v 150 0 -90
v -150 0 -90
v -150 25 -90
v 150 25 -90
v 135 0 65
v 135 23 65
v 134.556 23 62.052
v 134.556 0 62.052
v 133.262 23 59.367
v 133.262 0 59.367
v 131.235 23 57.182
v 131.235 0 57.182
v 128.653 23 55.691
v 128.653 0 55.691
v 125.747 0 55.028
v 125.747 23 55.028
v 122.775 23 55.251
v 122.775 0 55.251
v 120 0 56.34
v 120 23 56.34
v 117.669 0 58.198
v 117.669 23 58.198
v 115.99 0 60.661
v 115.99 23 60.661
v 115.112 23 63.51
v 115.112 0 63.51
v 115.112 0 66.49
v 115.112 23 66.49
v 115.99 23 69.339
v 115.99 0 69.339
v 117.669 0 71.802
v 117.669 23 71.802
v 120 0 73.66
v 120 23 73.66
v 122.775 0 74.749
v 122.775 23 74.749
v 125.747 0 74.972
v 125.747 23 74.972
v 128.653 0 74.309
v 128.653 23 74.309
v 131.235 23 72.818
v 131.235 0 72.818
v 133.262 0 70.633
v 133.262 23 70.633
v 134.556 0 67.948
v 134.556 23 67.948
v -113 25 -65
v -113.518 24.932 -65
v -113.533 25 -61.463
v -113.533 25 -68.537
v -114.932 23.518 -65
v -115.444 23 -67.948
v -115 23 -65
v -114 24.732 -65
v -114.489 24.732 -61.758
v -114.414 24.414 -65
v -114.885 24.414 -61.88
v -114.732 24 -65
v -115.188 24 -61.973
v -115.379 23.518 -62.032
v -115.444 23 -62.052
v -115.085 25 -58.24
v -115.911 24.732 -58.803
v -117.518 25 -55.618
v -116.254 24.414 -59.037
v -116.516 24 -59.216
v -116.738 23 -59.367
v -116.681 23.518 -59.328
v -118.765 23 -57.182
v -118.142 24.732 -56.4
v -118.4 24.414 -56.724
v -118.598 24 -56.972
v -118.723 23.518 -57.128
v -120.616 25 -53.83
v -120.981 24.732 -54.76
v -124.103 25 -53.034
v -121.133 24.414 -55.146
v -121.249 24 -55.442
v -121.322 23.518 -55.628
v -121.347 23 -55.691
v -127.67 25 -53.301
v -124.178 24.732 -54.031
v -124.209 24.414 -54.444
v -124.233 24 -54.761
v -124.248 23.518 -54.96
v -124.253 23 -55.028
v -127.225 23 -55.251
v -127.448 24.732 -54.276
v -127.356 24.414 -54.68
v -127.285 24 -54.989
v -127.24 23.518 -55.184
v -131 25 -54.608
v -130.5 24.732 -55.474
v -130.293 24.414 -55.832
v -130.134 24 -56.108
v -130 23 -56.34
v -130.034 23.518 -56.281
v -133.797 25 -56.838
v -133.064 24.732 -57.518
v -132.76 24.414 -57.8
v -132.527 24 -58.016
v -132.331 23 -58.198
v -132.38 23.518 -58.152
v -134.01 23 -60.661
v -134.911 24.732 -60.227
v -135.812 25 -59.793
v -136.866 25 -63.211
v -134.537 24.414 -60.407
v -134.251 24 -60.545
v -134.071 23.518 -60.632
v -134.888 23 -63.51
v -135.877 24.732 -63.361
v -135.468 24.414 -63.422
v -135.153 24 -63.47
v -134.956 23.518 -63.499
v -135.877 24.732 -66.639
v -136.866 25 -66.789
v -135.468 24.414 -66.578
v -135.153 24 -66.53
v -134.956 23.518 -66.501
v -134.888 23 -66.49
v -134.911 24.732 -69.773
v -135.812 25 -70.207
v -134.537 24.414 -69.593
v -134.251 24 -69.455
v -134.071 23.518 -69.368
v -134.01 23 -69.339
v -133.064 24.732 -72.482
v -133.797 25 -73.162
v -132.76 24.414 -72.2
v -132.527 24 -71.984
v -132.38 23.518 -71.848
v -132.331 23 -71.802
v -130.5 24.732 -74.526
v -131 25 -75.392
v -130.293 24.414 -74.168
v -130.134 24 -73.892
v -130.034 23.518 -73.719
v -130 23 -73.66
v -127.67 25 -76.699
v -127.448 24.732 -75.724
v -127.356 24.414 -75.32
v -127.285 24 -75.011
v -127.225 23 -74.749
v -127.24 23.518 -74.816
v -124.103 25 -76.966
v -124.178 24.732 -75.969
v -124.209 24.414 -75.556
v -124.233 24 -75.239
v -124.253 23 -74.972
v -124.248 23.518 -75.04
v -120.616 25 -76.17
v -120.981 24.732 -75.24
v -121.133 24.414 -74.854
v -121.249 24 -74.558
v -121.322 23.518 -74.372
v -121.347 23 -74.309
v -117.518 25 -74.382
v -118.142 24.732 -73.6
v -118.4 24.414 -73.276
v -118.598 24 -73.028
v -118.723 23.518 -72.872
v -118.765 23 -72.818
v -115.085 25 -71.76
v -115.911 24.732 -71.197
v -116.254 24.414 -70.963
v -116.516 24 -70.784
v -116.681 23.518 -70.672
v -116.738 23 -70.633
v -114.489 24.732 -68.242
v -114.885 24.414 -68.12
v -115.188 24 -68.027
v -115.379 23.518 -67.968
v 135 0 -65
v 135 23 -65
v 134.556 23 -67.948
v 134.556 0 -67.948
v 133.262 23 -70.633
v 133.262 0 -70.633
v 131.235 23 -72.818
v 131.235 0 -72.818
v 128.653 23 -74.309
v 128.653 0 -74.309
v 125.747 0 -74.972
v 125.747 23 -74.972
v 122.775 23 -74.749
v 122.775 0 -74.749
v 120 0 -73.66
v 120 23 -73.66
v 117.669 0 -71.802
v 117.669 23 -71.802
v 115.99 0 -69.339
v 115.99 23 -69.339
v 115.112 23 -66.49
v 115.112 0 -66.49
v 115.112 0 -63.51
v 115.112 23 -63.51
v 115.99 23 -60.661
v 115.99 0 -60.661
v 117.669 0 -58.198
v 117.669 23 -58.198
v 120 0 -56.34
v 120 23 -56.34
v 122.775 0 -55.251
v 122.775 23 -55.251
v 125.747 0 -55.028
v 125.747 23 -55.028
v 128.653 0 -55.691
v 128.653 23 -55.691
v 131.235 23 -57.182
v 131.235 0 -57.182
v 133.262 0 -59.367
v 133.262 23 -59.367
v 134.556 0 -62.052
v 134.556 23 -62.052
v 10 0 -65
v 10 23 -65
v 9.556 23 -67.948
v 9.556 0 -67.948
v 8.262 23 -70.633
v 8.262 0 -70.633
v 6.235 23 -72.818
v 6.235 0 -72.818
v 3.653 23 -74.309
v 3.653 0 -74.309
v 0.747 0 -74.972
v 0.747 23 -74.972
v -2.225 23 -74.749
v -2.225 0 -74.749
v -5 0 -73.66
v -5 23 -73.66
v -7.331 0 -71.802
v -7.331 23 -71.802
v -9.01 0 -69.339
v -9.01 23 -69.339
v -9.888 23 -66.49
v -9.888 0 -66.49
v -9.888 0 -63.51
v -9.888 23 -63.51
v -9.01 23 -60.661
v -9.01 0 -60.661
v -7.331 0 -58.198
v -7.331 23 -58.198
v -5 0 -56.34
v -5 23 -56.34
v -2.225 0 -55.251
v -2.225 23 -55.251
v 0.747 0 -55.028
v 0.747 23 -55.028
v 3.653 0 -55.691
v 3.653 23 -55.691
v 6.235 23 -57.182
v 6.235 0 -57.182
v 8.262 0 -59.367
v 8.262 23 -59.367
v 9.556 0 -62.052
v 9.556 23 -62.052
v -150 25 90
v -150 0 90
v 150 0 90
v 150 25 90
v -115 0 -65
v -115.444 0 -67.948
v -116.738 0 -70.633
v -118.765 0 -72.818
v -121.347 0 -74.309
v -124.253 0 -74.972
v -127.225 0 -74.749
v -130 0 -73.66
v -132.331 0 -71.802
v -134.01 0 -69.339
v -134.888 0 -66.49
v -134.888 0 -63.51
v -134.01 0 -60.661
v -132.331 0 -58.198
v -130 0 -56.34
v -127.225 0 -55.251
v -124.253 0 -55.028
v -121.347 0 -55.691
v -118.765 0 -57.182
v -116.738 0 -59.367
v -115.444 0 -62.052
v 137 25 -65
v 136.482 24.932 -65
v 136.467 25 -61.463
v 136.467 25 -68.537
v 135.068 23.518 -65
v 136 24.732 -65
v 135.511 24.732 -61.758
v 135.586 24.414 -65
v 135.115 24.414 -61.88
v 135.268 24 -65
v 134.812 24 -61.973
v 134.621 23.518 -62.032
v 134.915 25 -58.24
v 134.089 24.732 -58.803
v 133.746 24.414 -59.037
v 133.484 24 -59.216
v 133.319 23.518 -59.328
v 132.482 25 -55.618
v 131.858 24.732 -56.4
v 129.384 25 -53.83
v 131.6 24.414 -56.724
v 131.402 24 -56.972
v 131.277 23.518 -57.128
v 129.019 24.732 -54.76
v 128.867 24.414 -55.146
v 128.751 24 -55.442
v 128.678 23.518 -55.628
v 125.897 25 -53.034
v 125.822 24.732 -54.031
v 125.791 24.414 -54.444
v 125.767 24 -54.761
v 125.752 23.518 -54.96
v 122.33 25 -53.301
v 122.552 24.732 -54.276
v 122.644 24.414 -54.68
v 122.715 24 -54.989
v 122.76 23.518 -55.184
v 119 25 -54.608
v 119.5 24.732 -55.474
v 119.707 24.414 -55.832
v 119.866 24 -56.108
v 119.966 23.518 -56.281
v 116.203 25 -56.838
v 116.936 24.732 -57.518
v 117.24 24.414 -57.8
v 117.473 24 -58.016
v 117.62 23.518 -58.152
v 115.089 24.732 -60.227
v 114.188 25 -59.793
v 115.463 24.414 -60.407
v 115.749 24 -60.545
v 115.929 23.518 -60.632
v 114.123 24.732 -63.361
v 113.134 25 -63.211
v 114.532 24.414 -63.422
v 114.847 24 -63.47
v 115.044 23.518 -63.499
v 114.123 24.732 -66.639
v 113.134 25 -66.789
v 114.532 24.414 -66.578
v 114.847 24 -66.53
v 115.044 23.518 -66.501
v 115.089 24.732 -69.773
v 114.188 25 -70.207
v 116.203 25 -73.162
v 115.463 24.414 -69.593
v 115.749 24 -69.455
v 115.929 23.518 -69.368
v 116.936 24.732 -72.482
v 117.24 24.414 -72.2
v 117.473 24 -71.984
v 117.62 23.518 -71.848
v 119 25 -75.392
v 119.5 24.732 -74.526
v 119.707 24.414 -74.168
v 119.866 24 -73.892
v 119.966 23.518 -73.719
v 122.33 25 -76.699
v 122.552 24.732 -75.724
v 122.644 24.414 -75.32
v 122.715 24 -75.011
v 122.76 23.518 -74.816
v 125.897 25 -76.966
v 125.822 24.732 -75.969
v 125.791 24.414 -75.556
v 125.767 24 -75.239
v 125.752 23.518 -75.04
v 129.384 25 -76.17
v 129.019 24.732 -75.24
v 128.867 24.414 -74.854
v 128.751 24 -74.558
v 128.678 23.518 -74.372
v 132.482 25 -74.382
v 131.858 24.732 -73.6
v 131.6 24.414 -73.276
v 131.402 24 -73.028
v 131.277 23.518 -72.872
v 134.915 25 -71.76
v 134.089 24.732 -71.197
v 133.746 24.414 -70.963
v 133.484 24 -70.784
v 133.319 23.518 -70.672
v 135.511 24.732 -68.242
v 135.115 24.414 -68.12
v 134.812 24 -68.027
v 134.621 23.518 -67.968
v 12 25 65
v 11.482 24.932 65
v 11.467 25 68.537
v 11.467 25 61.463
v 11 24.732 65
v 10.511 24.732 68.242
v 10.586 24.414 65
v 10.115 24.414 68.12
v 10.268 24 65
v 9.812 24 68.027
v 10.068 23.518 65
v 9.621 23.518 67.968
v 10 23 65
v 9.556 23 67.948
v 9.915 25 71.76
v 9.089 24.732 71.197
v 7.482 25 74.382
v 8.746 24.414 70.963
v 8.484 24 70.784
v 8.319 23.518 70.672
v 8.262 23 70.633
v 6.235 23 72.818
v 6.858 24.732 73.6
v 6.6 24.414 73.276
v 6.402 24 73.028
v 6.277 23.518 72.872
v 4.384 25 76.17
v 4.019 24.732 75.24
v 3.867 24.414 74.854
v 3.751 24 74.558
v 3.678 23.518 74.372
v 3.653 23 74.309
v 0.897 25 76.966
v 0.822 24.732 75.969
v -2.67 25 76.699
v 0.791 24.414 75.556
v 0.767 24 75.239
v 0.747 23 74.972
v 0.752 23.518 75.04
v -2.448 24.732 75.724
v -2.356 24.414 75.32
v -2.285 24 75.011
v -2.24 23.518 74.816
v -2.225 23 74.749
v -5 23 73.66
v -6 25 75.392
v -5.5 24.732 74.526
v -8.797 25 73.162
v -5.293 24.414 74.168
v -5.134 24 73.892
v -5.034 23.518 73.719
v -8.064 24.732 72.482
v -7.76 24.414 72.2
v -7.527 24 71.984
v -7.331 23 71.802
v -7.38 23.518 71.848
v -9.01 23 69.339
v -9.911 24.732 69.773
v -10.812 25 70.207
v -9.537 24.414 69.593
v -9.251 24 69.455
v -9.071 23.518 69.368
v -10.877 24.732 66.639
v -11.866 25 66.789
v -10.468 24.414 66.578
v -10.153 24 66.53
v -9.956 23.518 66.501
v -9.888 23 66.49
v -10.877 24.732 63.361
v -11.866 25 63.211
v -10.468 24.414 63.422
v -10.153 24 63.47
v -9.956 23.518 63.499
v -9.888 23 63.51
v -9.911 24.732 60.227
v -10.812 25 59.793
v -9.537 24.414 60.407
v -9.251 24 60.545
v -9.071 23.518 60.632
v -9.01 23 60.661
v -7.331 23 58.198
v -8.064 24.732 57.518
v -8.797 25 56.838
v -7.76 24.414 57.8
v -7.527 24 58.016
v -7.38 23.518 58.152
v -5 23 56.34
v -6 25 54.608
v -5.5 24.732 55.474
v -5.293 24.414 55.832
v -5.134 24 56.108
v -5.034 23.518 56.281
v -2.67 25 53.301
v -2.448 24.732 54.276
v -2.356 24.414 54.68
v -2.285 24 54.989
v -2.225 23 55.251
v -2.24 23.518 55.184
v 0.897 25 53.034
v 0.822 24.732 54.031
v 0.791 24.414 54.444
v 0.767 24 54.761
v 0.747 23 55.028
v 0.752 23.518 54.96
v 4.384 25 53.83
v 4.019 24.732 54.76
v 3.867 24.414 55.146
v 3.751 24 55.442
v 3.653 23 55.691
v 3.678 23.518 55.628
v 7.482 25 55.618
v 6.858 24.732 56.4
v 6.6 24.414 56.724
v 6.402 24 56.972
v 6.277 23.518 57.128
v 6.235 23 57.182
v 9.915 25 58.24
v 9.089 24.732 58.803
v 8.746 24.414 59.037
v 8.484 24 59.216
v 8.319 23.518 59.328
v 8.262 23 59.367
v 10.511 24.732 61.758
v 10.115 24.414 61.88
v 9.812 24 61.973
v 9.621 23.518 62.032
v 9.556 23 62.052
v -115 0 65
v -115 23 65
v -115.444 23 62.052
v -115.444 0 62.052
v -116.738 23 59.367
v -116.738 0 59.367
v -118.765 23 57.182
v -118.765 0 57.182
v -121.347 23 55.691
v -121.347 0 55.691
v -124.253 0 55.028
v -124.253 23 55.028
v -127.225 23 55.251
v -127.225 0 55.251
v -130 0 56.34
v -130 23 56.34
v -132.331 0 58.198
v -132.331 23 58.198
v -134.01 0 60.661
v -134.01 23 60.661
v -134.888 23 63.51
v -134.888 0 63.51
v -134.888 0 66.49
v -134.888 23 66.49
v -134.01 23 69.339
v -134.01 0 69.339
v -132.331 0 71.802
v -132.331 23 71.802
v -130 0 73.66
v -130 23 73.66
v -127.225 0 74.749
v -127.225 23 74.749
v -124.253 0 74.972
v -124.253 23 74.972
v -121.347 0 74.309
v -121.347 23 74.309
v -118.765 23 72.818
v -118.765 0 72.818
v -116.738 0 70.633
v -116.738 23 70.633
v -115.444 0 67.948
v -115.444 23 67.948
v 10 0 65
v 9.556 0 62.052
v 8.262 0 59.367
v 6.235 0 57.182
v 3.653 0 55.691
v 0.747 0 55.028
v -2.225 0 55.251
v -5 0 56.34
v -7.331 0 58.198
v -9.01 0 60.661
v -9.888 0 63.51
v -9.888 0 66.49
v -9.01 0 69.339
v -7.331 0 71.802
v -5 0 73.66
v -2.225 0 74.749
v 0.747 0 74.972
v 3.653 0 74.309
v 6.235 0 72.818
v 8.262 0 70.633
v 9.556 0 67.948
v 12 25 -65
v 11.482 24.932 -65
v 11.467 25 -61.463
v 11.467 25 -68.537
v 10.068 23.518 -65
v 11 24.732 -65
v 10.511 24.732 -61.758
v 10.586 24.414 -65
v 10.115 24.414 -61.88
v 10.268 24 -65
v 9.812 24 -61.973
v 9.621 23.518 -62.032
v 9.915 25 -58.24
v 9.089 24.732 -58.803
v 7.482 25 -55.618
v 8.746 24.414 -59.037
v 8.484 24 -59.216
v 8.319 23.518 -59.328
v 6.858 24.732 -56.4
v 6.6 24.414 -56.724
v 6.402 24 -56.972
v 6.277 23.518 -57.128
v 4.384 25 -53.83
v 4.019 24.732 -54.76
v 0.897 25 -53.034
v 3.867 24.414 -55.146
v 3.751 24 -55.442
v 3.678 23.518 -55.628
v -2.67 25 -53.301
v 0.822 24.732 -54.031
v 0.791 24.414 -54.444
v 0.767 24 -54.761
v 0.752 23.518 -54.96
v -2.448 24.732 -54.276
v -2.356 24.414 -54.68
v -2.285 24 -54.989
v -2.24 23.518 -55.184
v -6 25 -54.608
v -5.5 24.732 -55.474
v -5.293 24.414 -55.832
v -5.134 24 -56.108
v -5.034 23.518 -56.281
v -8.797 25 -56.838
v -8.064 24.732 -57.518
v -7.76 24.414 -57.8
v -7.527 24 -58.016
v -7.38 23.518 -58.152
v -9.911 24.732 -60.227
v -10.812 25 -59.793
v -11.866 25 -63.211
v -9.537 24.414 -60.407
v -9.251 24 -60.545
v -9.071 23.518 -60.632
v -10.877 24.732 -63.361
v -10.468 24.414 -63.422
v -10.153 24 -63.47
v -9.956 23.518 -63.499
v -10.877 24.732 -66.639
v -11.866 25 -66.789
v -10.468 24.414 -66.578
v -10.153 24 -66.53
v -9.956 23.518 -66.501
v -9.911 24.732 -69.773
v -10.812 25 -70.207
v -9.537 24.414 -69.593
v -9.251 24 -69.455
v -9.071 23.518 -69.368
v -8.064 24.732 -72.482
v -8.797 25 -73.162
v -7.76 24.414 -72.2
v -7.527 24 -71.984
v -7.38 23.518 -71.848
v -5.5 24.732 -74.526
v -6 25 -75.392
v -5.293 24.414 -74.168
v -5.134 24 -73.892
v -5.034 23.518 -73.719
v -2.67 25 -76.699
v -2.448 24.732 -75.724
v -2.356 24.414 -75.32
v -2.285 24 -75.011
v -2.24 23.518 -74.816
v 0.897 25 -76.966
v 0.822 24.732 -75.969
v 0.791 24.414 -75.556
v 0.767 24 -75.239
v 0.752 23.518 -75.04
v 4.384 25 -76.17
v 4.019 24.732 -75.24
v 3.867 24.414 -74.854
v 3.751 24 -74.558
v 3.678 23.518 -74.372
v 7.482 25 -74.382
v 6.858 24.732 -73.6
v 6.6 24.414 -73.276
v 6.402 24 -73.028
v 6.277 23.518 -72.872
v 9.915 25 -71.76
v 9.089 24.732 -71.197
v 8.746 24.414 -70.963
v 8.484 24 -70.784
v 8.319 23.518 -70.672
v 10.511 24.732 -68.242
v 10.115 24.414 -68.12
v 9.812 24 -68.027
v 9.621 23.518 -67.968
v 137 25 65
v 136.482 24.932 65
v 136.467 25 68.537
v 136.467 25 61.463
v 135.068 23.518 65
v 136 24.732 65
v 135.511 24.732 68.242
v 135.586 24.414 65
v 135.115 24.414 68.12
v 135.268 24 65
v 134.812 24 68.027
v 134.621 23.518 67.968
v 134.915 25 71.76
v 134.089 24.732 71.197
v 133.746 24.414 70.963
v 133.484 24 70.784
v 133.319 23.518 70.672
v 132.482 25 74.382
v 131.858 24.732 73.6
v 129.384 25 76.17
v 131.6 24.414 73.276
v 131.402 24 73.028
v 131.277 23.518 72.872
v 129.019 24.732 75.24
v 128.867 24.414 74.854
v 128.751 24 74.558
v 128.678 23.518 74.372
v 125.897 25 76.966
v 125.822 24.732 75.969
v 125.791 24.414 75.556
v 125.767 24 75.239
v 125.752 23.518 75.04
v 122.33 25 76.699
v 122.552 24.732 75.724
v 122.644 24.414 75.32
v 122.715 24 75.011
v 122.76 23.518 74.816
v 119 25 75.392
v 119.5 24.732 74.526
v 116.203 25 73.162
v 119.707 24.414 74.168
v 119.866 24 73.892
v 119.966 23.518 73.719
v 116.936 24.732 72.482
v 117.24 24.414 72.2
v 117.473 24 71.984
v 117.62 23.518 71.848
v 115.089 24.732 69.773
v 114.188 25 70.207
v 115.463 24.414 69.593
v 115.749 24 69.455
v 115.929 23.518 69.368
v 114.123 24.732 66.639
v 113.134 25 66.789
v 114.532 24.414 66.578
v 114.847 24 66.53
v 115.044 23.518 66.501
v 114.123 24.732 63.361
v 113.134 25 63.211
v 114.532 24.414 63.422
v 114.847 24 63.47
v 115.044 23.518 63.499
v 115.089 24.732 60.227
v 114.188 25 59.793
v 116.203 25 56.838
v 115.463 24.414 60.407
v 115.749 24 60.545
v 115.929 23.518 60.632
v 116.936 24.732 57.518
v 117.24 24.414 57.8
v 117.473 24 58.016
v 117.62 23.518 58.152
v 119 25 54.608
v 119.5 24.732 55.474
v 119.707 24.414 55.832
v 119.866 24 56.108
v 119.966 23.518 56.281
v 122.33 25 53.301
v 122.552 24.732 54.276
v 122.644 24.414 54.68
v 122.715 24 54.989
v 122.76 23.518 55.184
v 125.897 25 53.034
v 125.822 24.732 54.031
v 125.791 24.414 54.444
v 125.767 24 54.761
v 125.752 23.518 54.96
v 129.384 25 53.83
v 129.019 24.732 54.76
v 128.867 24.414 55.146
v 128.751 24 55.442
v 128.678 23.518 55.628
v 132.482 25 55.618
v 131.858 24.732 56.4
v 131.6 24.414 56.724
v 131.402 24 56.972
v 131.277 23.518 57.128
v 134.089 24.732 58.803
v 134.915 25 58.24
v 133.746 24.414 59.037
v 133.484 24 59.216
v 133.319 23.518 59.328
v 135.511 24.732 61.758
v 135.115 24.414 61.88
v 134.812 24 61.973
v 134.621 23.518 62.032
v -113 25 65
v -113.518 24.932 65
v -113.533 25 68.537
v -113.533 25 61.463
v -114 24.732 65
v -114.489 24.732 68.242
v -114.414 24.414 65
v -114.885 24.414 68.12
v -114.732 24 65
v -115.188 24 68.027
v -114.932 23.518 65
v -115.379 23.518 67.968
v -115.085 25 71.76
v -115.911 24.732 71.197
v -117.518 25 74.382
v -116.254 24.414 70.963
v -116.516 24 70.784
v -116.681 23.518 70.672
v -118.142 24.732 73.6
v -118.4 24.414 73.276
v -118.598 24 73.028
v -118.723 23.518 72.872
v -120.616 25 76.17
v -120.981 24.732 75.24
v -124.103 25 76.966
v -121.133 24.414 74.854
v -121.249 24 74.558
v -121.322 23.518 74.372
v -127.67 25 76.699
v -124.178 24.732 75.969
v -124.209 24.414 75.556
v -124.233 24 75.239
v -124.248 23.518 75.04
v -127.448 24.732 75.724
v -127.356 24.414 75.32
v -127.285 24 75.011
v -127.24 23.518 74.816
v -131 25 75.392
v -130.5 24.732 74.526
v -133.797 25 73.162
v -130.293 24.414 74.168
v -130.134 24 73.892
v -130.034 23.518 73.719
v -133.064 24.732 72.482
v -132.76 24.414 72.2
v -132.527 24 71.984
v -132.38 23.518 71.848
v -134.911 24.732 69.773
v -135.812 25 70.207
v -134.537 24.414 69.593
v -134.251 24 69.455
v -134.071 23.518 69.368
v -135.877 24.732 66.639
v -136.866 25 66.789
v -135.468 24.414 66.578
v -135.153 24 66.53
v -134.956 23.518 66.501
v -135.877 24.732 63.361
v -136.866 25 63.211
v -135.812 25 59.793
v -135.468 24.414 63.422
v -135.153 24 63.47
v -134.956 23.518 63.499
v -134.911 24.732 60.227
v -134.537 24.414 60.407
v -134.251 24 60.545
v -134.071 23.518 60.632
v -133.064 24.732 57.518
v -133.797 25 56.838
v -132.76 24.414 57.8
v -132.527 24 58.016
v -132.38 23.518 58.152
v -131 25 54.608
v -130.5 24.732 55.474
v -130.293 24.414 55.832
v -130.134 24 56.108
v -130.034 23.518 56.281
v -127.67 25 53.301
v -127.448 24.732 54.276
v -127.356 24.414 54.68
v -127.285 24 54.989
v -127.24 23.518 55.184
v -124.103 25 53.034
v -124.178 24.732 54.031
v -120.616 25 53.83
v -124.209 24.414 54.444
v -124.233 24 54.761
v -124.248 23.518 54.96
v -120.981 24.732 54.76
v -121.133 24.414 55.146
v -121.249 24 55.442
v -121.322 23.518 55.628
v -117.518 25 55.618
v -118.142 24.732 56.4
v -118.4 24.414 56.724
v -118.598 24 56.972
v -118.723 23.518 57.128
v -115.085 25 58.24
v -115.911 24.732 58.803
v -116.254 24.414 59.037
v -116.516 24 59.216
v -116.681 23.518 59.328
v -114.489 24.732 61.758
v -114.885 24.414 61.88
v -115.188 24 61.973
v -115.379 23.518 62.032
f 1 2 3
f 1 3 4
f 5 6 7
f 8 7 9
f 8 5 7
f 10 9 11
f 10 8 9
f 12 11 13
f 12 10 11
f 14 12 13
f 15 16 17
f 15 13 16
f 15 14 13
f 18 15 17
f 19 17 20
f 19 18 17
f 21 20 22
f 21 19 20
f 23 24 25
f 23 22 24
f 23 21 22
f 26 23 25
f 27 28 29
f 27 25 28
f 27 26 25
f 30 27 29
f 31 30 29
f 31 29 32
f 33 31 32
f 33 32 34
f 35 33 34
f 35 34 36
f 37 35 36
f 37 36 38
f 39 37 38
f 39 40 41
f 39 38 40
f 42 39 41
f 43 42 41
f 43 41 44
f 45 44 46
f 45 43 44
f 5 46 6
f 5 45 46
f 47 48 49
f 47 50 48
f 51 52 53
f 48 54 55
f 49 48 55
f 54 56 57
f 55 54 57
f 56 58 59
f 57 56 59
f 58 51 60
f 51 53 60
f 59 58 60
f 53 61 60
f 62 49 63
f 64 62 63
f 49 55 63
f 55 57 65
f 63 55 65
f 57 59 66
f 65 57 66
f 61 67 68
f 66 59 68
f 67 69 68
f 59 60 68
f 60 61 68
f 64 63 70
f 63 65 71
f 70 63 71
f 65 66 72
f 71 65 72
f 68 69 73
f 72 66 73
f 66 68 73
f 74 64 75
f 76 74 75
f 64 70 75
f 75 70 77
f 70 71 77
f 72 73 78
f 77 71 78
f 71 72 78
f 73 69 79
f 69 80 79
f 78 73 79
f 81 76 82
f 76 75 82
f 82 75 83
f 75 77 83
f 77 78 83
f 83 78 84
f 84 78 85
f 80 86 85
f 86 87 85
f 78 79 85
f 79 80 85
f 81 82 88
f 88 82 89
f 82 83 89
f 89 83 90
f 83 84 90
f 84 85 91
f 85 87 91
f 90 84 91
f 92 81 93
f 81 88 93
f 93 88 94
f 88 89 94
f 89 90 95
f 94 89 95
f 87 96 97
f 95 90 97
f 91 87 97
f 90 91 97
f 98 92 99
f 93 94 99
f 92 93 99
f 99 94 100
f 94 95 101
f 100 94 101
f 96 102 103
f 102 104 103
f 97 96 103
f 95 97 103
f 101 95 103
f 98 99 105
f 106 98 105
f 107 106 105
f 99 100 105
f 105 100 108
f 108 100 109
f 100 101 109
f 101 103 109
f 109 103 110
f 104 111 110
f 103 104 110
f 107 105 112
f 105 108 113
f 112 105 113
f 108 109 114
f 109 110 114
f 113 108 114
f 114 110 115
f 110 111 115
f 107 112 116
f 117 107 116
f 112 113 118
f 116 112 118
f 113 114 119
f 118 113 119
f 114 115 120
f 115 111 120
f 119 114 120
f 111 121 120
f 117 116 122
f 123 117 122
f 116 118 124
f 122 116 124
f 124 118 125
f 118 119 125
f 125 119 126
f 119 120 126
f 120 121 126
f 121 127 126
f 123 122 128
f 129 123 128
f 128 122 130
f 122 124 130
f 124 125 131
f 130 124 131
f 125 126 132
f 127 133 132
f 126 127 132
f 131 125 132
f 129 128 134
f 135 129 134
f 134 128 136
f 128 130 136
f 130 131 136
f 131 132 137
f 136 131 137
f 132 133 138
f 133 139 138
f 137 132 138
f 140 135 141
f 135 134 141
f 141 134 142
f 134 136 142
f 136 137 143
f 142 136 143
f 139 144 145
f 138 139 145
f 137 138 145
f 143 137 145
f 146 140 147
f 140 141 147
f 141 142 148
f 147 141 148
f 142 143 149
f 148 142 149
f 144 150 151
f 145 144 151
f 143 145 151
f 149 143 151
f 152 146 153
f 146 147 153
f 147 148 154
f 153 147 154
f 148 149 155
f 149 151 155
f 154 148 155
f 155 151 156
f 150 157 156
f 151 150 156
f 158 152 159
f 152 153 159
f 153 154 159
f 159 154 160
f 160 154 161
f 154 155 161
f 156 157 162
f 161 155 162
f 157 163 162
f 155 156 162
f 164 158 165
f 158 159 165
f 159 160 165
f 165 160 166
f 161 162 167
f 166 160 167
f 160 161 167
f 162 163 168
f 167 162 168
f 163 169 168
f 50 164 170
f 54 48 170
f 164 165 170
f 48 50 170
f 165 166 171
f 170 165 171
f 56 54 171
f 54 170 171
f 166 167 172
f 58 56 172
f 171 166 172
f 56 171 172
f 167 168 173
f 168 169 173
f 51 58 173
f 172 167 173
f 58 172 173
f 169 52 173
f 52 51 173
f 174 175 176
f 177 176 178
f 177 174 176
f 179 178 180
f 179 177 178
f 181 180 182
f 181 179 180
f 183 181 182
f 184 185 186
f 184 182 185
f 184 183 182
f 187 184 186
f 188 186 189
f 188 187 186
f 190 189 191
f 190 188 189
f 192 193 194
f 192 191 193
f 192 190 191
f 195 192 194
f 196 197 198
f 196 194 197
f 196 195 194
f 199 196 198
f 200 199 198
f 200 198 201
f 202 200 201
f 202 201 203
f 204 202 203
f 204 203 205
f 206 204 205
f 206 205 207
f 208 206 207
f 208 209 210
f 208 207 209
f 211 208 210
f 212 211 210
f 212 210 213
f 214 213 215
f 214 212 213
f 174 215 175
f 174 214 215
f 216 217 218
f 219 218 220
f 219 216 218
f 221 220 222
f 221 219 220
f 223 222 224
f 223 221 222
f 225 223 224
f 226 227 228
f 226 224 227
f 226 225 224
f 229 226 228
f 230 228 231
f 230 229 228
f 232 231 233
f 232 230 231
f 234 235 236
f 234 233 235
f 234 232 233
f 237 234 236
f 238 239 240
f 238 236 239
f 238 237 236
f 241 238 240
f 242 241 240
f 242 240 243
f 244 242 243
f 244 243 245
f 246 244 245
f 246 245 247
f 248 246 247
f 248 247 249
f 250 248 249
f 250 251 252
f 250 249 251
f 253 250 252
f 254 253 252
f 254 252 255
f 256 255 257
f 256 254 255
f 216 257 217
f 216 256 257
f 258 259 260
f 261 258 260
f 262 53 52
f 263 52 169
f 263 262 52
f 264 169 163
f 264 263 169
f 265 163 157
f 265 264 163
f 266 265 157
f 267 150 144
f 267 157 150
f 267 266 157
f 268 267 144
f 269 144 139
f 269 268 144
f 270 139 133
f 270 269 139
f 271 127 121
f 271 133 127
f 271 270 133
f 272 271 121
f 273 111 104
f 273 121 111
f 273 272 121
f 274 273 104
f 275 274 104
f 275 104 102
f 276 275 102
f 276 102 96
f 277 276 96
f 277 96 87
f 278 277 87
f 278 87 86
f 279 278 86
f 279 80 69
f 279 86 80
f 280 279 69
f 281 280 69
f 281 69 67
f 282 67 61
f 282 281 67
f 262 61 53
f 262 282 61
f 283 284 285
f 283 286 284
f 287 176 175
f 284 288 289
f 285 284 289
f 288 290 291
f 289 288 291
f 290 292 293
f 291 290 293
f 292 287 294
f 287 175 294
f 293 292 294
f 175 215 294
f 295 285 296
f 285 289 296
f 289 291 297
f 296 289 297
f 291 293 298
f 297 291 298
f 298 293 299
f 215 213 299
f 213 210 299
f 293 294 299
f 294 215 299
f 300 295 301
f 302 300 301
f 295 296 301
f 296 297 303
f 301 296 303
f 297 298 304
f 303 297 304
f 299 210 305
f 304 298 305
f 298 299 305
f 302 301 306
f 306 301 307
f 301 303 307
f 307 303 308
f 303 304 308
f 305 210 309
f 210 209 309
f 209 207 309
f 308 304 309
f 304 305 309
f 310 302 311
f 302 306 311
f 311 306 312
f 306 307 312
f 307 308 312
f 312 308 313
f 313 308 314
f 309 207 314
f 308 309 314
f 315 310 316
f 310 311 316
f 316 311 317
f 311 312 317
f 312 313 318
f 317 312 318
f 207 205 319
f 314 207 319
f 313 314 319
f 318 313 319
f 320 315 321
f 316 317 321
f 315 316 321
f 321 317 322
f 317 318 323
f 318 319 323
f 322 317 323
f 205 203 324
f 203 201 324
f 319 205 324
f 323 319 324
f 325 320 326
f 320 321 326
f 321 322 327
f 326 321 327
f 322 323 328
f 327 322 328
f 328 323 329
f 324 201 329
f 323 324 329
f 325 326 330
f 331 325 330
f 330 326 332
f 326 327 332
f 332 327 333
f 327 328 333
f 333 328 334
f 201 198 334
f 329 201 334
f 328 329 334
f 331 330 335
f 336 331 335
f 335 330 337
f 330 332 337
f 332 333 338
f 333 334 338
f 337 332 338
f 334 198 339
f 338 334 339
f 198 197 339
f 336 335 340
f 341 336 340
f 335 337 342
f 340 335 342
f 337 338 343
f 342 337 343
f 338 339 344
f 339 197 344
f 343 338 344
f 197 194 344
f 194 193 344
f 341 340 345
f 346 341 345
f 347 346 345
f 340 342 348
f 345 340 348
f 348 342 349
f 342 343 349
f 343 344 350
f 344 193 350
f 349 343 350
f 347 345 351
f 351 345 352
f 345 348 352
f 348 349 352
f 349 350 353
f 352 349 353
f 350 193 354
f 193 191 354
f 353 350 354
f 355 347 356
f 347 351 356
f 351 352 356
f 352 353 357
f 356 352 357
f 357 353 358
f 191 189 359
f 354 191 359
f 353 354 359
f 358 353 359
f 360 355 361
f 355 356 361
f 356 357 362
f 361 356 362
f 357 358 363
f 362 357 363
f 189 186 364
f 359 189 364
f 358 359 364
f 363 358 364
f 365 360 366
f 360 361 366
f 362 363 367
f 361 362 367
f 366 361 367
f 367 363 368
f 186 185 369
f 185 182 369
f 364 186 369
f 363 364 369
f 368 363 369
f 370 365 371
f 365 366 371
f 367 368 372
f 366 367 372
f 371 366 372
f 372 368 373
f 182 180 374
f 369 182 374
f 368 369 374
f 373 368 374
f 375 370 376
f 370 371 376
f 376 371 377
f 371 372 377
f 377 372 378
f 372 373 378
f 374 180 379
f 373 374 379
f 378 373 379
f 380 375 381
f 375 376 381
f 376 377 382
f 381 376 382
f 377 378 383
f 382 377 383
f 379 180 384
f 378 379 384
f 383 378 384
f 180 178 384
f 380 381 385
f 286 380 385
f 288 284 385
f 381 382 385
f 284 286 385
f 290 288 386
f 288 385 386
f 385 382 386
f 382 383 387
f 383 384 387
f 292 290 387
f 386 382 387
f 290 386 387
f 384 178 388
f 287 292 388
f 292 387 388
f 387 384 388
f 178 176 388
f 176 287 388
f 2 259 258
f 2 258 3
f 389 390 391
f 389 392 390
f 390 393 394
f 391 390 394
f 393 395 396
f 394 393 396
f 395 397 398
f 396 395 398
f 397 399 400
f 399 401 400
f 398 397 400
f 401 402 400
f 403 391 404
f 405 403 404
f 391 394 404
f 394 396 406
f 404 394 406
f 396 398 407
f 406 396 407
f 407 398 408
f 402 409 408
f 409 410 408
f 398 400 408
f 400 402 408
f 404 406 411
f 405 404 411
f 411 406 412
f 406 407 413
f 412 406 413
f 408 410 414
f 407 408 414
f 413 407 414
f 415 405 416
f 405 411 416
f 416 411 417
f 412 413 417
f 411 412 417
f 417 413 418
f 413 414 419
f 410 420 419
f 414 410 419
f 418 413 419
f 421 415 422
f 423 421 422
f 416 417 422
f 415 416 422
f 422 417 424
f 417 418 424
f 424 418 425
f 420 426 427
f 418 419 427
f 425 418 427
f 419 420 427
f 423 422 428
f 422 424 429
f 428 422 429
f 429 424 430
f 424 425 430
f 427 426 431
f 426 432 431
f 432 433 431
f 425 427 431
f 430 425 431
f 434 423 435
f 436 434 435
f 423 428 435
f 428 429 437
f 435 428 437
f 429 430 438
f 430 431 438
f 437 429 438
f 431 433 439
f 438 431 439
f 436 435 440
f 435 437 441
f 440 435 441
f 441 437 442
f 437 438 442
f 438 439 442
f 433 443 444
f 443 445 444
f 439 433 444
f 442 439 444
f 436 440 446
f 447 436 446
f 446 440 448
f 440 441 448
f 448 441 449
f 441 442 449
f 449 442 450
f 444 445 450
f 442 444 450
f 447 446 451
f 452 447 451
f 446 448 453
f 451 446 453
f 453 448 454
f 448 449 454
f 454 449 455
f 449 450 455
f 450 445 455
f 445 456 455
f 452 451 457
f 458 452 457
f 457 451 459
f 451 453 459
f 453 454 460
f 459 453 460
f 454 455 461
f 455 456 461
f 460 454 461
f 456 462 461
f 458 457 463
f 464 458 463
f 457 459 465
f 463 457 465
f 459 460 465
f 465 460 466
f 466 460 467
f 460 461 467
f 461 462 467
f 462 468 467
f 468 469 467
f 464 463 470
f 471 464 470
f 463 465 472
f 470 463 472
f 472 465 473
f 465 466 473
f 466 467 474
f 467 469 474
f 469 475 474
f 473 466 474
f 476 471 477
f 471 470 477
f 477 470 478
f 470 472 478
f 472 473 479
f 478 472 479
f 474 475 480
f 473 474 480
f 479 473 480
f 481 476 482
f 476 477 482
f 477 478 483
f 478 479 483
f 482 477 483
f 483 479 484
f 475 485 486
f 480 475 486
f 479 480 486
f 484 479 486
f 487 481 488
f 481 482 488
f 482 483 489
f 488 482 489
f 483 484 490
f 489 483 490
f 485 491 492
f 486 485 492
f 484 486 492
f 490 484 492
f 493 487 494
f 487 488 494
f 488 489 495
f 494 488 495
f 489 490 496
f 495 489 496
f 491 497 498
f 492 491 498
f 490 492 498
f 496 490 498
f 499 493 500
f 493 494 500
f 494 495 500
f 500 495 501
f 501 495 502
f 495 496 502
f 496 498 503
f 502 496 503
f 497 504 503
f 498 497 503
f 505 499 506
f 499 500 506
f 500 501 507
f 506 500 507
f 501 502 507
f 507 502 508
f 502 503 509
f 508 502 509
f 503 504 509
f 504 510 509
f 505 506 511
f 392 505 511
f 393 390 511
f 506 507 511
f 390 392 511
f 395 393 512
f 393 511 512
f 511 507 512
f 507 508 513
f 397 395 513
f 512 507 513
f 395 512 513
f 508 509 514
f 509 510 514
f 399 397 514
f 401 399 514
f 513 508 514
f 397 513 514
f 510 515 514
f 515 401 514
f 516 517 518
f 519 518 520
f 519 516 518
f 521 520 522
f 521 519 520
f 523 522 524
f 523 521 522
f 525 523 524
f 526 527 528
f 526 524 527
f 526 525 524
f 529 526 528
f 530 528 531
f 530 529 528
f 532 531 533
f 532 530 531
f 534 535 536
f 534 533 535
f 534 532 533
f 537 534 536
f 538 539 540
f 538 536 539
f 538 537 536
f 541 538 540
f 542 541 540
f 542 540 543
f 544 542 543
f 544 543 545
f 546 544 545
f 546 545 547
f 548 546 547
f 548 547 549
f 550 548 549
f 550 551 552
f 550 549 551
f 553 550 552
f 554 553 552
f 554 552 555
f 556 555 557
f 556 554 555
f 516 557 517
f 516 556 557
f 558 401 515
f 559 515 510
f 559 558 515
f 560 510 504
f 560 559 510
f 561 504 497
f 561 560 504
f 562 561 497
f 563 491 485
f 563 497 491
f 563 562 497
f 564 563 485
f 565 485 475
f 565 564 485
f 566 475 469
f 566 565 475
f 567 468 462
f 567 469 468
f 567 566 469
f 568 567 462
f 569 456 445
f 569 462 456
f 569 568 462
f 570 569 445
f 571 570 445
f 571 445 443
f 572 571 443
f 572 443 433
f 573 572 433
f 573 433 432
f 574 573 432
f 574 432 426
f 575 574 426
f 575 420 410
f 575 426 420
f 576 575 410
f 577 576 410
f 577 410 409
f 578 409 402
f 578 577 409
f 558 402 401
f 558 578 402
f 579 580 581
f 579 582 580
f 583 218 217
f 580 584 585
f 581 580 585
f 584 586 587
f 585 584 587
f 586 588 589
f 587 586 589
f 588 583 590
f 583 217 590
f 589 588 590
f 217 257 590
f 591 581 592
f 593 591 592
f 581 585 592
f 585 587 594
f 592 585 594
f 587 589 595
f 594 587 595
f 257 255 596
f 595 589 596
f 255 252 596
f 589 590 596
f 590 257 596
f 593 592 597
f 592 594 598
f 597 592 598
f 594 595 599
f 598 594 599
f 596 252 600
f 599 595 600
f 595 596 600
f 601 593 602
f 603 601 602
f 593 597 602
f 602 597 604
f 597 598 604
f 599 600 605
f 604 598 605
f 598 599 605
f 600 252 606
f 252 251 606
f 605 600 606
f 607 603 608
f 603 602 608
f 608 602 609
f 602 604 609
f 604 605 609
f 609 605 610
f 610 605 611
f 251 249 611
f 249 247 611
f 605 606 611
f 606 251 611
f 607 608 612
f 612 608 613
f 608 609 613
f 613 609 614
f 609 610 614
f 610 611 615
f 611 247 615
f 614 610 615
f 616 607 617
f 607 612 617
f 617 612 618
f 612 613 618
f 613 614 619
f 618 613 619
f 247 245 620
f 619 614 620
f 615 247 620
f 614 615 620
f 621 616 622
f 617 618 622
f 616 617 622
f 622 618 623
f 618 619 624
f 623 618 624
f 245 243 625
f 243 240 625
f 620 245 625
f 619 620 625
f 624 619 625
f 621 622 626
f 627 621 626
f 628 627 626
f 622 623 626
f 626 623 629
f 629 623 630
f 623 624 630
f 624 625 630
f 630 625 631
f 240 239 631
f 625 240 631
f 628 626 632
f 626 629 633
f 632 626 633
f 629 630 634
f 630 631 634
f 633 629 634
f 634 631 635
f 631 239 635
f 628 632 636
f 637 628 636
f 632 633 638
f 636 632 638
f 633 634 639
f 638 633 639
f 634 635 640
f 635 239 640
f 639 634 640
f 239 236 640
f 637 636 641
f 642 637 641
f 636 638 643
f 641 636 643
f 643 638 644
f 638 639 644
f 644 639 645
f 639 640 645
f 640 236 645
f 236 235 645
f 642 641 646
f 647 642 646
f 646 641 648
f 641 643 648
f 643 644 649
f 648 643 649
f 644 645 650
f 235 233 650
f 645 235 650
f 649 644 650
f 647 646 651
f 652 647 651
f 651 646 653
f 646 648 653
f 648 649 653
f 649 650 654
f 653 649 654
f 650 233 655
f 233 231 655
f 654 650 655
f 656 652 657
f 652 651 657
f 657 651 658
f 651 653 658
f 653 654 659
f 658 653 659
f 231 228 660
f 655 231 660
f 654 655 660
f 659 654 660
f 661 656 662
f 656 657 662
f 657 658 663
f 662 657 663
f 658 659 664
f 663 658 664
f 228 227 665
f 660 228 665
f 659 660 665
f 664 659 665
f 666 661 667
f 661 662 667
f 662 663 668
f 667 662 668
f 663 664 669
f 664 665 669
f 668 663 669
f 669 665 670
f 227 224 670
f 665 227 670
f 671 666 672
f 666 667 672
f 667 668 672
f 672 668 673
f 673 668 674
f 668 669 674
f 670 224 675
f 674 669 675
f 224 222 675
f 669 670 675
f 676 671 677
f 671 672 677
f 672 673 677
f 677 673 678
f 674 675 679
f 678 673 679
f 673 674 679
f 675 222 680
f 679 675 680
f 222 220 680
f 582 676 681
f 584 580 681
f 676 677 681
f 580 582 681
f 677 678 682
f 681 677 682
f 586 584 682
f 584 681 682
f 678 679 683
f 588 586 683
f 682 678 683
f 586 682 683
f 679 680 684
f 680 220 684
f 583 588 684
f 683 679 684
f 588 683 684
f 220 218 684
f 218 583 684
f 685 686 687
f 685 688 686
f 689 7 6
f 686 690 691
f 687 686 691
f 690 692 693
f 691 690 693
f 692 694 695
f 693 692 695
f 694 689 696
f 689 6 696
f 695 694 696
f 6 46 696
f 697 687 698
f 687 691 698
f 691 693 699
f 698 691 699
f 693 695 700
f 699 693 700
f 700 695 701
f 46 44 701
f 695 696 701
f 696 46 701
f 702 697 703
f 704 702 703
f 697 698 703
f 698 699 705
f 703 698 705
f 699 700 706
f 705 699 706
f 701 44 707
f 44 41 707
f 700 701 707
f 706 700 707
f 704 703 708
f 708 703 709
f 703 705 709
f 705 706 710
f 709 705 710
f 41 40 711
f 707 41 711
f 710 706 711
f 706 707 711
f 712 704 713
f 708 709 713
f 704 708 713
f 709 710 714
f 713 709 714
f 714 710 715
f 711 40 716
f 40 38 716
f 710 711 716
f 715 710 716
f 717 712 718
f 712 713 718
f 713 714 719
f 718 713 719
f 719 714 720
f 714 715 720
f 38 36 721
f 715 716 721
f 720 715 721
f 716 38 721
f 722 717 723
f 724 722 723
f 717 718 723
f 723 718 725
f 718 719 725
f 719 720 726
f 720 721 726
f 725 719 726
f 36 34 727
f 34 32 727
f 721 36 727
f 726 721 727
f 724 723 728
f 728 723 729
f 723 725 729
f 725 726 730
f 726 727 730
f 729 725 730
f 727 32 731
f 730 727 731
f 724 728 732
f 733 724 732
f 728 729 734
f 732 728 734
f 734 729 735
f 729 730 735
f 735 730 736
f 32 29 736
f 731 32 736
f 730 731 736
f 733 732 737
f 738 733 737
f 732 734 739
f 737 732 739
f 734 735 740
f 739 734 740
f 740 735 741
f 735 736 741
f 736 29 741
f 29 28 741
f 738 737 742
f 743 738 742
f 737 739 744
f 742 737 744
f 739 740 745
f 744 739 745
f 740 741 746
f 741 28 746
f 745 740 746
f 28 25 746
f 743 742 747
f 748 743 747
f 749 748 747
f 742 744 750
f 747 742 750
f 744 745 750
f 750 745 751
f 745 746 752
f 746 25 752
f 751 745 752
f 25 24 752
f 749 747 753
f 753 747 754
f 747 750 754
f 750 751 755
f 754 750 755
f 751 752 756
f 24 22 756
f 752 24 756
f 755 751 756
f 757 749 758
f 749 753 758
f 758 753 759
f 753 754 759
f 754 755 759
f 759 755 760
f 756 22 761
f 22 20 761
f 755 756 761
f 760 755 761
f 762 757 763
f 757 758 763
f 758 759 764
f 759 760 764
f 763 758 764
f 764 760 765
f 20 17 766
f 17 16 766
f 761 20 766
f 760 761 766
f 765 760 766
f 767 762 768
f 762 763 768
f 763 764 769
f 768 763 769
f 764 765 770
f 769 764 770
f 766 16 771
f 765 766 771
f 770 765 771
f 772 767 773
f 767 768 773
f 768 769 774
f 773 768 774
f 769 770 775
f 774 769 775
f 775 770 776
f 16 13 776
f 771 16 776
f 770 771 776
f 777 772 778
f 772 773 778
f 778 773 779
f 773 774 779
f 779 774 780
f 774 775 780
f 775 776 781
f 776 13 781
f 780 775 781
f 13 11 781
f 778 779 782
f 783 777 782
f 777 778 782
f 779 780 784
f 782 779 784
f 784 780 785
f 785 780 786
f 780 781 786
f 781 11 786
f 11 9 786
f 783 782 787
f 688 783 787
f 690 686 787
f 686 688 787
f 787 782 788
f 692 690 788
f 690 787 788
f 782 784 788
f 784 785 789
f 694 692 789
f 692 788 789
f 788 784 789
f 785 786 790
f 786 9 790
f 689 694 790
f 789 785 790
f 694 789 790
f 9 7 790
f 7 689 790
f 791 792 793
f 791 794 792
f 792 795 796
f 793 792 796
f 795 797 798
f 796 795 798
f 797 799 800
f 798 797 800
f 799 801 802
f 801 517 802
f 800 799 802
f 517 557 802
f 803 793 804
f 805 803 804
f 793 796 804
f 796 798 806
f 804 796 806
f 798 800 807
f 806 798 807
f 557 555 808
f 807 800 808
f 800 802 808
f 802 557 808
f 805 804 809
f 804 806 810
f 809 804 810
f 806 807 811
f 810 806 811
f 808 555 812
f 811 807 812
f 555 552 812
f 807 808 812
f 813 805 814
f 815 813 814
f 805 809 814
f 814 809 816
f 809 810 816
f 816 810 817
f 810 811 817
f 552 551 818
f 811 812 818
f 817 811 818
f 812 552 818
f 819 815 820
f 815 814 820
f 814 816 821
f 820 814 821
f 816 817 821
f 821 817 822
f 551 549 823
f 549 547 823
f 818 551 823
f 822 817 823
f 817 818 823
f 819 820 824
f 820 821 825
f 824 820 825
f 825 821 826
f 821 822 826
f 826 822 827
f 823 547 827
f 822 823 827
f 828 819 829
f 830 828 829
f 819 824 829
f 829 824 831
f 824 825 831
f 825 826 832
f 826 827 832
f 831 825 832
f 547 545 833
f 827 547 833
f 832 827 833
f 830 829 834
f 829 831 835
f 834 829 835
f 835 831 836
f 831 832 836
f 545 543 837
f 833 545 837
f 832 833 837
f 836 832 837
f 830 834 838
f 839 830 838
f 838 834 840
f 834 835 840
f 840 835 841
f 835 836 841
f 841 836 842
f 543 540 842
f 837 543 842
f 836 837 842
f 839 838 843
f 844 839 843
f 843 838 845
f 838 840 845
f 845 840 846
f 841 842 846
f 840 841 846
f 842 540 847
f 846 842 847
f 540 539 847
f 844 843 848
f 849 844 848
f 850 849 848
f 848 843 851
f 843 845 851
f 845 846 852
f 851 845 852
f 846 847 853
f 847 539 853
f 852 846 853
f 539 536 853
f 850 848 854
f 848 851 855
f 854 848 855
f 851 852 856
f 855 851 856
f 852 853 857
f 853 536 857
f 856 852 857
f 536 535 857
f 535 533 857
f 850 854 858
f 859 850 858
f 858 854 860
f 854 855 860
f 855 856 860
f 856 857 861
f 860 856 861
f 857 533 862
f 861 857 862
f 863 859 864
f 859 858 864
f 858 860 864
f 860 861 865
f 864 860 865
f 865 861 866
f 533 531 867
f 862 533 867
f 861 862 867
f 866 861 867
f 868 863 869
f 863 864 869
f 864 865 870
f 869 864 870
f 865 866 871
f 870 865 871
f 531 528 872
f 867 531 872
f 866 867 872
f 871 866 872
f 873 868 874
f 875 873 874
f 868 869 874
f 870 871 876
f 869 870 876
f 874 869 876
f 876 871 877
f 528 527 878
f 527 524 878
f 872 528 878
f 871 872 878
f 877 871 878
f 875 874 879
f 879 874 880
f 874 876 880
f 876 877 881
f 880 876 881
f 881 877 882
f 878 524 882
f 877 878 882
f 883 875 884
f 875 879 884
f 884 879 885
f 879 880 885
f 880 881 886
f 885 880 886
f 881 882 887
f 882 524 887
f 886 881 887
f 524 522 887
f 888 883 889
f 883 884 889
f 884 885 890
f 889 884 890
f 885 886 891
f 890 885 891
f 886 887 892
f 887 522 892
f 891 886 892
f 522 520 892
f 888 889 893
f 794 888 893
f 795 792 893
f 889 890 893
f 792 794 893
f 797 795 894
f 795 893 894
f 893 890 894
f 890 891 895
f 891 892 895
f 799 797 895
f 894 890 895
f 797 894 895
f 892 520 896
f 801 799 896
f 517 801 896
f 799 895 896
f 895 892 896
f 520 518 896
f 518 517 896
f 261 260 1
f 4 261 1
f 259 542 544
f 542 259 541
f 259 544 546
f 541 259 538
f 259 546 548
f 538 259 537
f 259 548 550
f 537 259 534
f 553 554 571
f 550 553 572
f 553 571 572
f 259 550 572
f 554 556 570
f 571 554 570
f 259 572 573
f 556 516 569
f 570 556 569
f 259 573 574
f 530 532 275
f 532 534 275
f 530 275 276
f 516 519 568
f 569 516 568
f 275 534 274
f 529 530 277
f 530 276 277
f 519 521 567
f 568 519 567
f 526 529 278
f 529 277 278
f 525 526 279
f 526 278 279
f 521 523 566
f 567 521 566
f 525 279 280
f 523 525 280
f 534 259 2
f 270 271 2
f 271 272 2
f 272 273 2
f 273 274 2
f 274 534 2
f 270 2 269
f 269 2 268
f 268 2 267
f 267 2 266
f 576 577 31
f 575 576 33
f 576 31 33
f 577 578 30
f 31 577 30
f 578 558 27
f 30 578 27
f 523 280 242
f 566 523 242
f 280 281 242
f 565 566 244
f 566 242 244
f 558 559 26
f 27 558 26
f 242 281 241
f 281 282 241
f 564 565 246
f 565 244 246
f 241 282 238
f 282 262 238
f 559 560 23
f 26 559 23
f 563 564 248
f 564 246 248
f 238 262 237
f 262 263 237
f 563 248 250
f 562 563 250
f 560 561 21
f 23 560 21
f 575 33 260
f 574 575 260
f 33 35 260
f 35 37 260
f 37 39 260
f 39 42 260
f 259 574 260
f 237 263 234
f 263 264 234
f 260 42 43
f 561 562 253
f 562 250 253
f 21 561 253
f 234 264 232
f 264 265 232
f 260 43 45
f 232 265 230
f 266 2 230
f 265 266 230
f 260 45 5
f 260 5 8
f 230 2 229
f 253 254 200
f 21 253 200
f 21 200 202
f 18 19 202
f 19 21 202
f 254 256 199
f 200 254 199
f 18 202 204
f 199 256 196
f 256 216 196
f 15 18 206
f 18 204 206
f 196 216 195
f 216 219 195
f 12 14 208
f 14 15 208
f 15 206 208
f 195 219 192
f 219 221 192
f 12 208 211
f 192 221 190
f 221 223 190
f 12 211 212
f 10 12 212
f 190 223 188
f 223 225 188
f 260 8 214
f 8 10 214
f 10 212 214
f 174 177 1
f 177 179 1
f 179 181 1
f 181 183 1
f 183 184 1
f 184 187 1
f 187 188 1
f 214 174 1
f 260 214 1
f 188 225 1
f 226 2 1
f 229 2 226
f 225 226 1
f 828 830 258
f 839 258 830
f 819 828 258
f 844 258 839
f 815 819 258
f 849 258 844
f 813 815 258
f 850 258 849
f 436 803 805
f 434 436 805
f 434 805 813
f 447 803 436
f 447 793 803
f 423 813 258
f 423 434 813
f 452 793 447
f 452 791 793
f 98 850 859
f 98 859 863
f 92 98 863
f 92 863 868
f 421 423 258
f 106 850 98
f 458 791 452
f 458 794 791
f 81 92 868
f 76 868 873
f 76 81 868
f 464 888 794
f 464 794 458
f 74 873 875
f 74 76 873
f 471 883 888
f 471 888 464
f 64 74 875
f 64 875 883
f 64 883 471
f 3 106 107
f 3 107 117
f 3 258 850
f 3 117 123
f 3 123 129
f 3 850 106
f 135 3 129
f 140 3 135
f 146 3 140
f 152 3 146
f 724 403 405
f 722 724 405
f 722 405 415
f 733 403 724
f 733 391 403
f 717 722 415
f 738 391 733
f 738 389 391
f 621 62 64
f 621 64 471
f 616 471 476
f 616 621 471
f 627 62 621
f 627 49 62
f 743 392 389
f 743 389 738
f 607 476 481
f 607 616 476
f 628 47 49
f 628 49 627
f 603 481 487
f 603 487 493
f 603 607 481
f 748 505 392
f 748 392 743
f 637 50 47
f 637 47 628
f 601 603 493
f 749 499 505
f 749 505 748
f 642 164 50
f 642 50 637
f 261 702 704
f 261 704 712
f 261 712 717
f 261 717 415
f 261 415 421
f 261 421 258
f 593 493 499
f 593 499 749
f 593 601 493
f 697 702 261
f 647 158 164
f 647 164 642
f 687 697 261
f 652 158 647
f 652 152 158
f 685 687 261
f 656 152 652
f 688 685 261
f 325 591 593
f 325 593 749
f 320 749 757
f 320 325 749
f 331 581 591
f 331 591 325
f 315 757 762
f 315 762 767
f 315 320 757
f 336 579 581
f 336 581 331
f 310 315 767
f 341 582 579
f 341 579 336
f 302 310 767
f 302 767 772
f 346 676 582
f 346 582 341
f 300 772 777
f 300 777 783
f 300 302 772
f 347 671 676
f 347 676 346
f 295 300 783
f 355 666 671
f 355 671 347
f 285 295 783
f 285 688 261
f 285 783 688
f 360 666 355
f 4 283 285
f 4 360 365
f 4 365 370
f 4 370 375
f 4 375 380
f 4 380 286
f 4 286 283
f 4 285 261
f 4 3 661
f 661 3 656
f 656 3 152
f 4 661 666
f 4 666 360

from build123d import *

# Parameters (mm, degrees)
SKETCH1_W           = 300
SKETCH1_H           = 180
BOSS_EXTRUDE1_DEPTH = 25
SKETCH2_R           = 10
CUT_EXTRUDE4_DEPTH  = 212
SKETCH2_5_R         = 10
CUT_EXTRUDE5_DEPTH  = 159
SKETCH2_6_R         = 10
CUT_EXTRUDE6_DEPTH  = 209
SKETCH2_7_R         = 10
CUT_EXTRUDE7_DEPTH  = 305
FILLET1_R           = 2


with BuildPart() as part:
    # Sketch1 → Boss-Extrude1 (new body)
    with BuildSketch(Plane(origin=(0, 0, 0), x_dir=(1, 0, 0), z_dir=(0, 1, 0))):
        Rectangle(SKETCH1_W, SKETCH1_H)
    extrude(amount=BOSS_EXTRUDE1_DEPTH)

    # Sketch2 → Cut-Extrude4 (cut)
    with BuildSketch(Plane(origin=(0, 0, 0), x_dir=(1, 0, 0), z_dir=(0, 1, 0))):
        with Locations((0, 65)):
            Circle(SKETCH2_R)
    extrude(amount=CUT_EXTRUDE4_DEPTH, mode=Mode.SUBTRACT)

    # Sketch2<5> → Cut-Extrude5 (cut)
    with BuildSketch(Plane(origin=(0, 0, 0), x_dir=(1, 0, 0), z_dir=(0, 1, 0))):
        with Locations((-125, 65)):
            Circle(SKETCH2_5_R)
    extrude(amount=CUT_EXTRUDE5_DEPTH, mode=Mode.SUBTRACT)

    # Sketch2<6> → Cut-Extrude6 (cut)
    with BuildSketch(Plane(origin=(0, 0, 0), x_dir=(1, 0, 0), z_dir=(0, 1, 0))):
        with Locations((125, 65)):
            Circle(SKETCH2_6_R)
    extrude(amount=CUT_EXTRUDE6_DEPTH, mode=Mode.SUBTRACT)

    # Sketch2<7> → Cut-Extrude7 (cut)
    with BuildSketch(Plane(origin=(0, 0, 0), x_dir=(1, 0, 0), z_dir=(0, 1, 0))):
        with Locations((125, -65)):
            Circle(SKETCH2_7_R)
        with Locations((0, -65)):
            Circle(SKETCH2_7_R)
        with Locations((-125, -65)):
            Circle(SKETCH2_7_R)
    extrude(amount=CUT_EXTRUDE7_DEPTH, mode=Mode.SUBTRACT)

    # Fillet1
    fillet1_edges = [part.edges().sort_by_distance(p)[0] for p in [
        (-10, 25, -65),
        (-135, 25, -65),
        (115, 25, -65),
        (-135, 25, 65),
        (-10, 25, 65),
        (115, 25, 65),
    ]]
    fillet(fillet1_edges, radius=FILLET1_R)


solid = part.part
